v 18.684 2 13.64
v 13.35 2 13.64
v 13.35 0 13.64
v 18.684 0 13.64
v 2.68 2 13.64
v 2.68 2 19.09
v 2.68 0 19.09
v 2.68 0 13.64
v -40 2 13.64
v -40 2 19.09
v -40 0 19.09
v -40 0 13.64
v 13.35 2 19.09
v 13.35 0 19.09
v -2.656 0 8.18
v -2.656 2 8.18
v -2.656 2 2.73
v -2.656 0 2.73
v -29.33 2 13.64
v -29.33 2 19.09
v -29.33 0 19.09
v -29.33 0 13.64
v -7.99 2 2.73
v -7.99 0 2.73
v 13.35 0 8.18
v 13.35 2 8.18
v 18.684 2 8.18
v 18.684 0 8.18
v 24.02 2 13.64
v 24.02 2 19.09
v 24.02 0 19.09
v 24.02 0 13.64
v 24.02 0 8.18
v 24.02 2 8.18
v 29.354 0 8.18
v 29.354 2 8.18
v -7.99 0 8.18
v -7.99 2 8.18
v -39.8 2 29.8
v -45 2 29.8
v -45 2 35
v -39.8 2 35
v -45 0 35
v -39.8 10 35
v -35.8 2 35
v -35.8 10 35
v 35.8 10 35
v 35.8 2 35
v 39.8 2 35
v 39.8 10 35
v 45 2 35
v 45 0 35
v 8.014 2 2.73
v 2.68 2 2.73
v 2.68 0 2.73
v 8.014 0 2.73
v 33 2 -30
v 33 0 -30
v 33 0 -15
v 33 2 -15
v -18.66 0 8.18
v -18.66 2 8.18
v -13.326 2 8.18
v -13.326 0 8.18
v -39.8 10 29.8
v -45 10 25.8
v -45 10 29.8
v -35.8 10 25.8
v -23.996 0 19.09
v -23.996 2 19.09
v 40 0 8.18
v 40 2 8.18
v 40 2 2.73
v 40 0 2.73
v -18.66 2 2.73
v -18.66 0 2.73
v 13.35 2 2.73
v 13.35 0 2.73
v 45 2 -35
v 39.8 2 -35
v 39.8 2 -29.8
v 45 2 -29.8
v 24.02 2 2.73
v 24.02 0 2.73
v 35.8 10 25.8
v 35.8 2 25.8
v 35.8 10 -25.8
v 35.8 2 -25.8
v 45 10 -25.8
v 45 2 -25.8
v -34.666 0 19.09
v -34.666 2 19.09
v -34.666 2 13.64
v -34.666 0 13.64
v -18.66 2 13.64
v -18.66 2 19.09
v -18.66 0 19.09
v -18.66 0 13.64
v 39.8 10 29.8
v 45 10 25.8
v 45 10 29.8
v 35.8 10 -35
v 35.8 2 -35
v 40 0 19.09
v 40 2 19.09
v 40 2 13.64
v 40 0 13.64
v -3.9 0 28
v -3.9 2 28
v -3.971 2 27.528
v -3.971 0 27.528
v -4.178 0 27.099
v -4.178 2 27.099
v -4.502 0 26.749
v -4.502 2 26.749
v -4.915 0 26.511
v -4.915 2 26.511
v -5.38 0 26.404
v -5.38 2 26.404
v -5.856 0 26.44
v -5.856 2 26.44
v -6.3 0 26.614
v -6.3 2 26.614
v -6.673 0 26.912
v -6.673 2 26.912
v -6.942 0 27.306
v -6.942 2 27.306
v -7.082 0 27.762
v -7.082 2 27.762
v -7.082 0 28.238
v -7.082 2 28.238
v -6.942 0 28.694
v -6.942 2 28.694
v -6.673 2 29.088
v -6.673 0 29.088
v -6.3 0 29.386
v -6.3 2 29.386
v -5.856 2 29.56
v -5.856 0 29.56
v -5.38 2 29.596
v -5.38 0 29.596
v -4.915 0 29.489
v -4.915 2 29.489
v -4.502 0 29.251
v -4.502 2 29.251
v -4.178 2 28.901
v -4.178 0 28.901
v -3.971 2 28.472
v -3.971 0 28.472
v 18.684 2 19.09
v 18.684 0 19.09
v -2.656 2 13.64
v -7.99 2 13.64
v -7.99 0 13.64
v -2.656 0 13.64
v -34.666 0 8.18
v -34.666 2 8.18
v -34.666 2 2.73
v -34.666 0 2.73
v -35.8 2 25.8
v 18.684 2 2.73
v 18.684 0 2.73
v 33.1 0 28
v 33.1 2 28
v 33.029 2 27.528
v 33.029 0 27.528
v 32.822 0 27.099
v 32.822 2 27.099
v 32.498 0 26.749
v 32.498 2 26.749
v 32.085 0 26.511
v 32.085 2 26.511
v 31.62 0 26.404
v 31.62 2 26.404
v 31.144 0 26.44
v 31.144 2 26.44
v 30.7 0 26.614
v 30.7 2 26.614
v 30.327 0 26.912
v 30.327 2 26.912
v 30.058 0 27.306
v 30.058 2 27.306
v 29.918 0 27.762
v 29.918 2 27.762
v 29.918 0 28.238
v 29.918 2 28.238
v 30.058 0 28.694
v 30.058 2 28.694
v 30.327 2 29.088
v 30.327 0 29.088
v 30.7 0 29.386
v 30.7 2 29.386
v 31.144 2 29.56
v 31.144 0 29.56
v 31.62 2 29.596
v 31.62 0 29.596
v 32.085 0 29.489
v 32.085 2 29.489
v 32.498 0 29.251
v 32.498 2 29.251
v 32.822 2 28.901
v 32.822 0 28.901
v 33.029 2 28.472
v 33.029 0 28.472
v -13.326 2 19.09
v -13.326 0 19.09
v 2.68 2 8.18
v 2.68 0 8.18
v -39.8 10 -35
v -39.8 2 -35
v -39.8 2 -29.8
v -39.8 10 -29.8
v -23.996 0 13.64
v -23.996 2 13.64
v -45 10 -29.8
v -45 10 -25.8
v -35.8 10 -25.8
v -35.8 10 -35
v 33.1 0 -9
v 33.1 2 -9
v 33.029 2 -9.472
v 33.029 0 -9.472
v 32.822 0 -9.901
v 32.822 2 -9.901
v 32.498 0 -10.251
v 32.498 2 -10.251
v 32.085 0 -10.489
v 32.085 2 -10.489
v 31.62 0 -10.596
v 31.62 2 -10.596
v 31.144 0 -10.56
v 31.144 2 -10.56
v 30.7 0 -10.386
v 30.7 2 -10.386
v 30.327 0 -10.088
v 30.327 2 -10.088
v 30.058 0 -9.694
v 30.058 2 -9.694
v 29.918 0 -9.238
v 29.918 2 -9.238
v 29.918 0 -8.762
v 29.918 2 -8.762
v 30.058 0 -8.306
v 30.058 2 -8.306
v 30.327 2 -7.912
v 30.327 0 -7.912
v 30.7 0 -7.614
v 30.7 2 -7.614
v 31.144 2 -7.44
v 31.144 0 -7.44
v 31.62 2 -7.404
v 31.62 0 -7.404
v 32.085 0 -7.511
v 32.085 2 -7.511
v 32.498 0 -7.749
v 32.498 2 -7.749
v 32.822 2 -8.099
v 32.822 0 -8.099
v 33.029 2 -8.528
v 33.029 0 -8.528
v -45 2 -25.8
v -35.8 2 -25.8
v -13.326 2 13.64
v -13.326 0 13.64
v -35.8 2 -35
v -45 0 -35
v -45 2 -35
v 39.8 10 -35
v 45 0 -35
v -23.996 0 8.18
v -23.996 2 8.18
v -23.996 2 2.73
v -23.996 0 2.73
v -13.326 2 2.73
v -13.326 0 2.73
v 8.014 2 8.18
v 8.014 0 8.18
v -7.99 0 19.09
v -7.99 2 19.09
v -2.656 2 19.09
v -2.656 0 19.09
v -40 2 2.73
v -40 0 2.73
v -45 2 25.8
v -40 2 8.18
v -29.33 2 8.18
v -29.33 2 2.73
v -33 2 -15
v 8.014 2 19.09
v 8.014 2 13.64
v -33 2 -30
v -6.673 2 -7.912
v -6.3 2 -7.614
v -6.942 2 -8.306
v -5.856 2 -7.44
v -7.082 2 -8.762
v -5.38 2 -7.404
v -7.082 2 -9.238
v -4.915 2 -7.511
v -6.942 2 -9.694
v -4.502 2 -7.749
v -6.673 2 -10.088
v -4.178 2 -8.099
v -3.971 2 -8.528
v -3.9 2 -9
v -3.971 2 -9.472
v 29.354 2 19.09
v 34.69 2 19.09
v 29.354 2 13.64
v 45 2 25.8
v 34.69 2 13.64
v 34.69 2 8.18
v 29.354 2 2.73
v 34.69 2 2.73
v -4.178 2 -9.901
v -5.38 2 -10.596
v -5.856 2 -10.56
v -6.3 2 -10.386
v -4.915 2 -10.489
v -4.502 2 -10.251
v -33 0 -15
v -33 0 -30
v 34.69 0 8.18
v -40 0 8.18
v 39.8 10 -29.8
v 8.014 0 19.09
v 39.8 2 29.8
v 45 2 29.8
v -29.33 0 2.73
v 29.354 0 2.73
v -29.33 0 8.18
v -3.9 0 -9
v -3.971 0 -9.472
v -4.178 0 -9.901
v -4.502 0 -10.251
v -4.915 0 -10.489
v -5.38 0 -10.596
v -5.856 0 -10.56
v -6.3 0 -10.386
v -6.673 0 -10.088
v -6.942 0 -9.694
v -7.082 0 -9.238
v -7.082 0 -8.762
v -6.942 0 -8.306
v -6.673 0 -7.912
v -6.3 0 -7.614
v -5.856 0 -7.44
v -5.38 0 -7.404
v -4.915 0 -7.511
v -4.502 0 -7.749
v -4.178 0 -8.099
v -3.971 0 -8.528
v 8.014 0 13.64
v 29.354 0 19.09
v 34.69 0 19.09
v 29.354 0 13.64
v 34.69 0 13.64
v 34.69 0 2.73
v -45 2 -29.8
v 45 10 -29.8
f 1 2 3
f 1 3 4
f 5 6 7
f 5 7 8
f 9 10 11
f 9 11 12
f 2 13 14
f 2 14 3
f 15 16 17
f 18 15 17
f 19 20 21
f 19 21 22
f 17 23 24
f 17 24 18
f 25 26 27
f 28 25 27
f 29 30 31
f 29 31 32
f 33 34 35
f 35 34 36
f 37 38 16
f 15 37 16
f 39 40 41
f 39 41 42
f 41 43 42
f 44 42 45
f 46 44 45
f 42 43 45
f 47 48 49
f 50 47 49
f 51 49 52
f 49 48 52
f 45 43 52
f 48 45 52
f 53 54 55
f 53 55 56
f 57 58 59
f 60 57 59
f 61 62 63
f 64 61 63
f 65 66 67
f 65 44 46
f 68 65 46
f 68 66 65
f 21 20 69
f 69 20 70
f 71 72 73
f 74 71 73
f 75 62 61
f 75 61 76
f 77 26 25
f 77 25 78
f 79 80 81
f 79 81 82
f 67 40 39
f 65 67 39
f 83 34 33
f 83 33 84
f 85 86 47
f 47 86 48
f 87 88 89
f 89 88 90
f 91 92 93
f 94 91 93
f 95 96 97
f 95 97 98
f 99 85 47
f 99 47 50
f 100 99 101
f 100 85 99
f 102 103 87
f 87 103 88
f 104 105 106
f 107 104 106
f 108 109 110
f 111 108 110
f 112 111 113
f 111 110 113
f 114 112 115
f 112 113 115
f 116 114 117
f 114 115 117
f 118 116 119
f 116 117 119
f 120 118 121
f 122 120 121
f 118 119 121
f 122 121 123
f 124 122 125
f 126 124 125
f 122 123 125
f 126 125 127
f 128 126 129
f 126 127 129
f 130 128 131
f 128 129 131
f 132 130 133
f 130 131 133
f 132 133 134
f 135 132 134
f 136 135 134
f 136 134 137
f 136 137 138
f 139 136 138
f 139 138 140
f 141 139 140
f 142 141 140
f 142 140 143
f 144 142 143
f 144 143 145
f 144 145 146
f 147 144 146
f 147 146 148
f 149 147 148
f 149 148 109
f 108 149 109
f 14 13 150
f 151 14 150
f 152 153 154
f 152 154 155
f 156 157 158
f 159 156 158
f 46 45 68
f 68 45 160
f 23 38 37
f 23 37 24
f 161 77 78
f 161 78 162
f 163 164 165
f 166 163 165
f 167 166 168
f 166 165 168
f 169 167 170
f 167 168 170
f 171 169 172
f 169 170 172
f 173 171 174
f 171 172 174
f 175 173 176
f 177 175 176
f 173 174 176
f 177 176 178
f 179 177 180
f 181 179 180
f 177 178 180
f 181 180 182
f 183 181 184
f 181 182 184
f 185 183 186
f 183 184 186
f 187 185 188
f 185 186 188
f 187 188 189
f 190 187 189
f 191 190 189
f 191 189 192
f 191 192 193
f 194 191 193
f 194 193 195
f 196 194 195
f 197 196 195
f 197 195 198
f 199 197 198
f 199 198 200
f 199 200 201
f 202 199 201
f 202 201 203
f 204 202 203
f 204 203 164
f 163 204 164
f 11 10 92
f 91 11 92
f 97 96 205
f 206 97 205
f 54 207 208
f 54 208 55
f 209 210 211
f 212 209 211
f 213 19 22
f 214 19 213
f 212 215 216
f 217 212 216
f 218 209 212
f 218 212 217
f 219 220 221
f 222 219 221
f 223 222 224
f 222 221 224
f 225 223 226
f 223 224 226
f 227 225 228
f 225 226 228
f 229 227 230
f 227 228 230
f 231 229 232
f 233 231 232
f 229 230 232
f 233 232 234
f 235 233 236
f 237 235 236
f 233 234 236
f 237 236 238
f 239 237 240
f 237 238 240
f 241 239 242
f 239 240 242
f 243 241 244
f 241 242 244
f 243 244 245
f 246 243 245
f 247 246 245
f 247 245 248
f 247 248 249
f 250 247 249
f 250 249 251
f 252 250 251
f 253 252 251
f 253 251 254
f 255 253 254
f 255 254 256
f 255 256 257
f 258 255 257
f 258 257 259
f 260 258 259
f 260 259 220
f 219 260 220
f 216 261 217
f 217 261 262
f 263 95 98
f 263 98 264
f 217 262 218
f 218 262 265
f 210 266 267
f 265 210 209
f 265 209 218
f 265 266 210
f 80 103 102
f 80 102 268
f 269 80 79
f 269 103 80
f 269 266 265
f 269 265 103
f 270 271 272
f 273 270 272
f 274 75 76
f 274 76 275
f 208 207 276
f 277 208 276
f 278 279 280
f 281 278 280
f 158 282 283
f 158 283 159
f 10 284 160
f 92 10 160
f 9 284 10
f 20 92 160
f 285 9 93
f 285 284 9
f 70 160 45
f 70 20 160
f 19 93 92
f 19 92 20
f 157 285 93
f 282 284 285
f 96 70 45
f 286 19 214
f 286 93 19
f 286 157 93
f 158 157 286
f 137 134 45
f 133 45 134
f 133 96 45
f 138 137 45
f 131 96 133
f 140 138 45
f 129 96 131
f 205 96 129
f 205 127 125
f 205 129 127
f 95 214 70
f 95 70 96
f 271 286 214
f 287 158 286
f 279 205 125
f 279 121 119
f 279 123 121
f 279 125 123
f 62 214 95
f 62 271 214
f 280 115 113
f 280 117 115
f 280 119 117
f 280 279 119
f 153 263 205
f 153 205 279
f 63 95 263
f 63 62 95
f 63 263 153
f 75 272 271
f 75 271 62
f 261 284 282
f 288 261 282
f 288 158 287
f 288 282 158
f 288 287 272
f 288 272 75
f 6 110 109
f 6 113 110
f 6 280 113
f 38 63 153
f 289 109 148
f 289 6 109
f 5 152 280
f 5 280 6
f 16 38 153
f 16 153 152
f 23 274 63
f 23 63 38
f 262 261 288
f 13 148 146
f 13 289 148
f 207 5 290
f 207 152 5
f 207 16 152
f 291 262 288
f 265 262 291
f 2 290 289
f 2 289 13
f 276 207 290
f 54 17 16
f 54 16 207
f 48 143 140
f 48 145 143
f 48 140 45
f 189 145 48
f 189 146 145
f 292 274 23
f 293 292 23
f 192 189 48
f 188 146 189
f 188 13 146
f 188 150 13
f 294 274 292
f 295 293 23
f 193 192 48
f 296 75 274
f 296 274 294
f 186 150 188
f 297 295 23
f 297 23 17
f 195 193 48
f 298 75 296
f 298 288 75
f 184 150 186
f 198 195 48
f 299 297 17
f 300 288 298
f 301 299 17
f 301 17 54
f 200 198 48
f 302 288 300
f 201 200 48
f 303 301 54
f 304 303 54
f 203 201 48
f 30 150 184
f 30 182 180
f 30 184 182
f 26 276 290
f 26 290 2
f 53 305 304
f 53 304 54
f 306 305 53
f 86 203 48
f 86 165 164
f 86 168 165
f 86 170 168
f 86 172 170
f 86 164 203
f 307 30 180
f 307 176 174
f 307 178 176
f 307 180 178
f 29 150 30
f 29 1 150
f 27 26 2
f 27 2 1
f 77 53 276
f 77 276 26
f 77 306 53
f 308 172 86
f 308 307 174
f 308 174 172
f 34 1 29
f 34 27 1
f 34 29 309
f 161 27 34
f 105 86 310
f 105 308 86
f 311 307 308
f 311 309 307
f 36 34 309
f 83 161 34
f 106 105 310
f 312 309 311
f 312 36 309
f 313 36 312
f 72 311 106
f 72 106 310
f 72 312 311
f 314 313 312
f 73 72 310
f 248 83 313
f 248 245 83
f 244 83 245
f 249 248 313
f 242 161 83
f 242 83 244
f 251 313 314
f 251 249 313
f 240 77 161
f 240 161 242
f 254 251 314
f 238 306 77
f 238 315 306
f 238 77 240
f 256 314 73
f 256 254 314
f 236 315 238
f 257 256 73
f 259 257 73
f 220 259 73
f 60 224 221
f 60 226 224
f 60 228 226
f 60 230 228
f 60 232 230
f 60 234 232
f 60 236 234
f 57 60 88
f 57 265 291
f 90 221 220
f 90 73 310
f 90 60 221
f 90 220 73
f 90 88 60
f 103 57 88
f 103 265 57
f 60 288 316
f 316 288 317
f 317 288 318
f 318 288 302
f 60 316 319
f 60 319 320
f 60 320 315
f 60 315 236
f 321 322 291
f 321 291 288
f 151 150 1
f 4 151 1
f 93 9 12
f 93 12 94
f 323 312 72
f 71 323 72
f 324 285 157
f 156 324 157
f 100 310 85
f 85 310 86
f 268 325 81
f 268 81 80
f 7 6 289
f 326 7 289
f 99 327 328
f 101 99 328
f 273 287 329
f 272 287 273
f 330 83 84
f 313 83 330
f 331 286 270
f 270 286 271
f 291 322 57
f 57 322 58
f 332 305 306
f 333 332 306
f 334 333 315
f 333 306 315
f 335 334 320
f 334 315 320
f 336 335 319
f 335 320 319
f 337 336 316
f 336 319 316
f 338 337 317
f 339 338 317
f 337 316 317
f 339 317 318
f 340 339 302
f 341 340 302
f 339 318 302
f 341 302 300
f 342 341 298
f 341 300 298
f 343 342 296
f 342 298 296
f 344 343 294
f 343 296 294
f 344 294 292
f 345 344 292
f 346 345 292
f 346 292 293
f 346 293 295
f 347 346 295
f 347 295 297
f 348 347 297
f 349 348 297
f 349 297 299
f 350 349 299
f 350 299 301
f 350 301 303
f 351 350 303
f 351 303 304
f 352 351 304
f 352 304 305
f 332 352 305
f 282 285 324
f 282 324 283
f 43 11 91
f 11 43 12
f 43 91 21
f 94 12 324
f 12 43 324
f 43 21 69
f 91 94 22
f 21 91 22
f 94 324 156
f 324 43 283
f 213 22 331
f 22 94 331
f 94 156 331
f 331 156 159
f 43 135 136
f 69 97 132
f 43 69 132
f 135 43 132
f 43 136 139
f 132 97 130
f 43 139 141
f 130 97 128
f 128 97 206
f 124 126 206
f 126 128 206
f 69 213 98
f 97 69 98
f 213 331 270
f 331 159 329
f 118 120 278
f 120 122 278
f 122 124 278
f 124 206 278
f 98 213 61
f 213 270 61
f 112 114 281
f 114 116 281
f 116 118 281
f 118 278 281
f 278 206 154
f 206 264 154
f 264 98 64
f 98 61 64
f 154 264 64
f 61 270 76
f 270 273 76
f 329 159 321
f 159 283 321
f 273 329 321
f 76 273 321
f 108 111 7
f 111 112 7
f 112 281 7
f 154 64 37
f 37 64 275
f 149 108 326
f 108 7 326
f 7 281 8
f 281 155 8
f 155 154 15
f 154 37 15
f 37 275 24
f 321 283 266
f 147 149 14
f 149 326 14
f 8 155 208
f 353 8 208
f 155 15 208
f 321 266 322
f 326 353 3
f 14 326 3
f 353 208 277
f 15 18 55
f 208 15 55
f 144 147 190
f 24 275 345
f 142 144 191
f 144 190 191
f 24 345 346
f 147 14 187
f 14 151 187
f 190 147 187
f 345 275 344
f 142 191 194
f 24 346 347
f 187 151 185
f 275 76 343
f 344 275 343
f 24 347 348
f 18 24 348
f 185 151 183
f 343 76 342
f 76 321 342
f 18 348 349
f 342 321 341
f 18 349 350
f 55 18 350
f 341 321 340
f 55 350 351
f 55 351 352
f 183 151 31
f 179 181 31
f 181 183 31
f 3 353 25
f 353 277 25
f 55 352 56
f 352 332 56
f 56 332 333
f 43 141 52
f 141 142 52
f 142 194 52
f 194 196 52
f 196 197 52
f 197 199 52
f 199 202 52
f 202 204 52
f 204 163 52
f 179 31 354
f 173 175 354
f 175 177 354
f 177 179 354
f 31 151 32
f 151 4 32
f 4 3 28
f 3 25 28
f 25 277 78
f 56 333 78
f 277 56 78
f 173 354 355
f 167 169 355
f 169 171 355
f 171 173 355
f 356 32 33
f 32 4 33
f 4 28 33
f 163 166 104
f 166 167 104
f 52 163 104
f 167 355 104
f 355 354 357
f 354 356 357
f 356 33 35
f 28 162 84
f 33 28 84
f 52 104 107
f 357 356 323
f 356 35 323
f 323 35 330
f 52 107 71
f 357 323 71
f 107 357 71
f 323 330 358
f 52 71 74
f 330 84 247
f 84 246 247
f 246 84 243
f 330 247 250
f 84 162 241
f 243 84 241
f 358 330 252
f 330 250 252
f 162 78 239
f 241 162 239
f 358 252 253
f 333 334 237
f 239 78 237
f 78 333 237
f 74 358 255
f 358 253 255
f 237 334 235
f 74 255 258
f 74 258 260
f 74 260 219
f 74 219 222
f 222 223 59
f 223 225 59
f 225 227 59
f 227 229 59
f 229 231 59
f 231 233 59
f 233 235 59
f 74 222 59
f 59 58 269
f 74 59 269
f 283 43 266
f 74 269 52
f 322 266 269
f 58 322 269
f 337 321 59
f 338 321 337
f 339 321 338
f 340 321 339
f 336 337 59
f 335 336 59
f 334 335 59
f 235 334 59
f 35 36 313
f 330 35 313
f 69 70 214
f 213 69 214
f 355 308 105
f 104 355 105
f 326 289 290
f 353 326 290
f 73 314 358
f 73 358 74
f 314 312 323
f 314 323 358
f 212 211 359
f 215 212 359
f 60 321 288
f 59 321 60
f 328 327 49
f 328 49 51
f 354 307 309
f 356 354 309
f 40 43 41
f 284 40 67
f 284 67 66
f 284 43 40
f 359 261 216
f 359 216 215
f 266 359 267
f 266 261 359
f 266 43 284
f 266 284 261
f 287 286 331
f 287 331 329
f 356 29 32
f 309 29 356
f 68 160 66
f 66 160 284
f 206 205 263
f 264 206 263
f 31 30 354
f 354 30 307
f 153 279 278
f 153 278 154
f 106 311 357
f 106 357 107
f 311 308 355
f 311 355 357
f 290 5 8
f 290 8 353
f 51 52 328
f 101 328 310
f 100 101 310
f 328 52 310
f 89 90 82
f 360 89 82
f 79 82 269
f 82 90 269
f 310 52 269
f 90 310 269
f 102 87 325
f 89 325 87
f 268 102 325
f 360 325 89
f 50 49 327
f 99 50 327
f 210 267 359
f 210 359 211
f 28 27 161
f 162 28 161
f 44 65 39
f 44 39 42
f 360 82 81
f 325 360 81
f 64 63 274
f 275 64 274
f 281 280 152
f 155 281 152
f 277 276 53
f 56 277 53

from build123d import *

# Parameters (mm, degrees)
ESBO_O1_W                = 90
ESBO_O1_H                = 70
RESSALTO_EXTRUS_O1_DEPTH = 2
RESSALTO_EXTRUS_O4_DEPTH = 8
ESBO_O6_W                = 66
ESBO_O6_H                = 15
CORTE_EXTRUS_O4_DEPTH    = 3
ESBO_O2_W                = 5.334
ESBO_O2_H                = 5.45
ESBO_O2_W_2              = 5.31
CORTE_EXTRUS_O6_DEPTH    = 5
ESBO_O7_R                = 1.6
CORTE_EXTRUS_O7_DEPTH    = 3


with BuildPart() as part:
    # Esboço1 → Ressalto-extrusão1 (new body)
    with BuildSketch(Plane(origin=(0, 0, 0), x_dir=(1, 0, 0), z_dir=(0, 1, 0))):
        Rectangle(ESBO_O1_W, ESBO_O1_H)
    extrude(amount=RESSALTO_EXTRUS_O1_DEPTH)

    # Esboço3 → Ressalto-extrusão4 (add)
    with BuildSketch(Plane(origin=(0, 2, 0), x_dir=(1, 0, 0), z_dir=(0, 1, 0))):
        Polygon((-35.8, -25.8), (-45, -25.8), (-45, -29.8), (-39.8, -29.8), (-39.8, -35), (-35.8, -35), align=None)
        Polygon((45, -29.8), (45, -25.8), (35.8, -25.8), (35.8, -35), (39.8, -35), (39.8, -29.8), align=None)
        Polygon((39.8, 35), (35.8, 35), (35.8, 25.8), (45, 25.8), (45, 29.8), (39.8, 29.8), align=None)
        Polygon((-35.8, 35), (-39.8, 35), (-39.8, 29.8), (-45, 29.8), (-45, 25.8), (-35.8, 25.8), align=None)
    extrude(amount=RESSALTO_EXTRUS_O4_DEPTH)

    # Esboço6 → Corte-extrusão4 (cut)
    with BuildSketch(Plane.XZ):
        with Locations((0, -22.5)):
            Rectangle(ESBO_O6_W, ESBO_O6_H)
    extrude(amount=-CORTE_EXTRUS_O4_DEPTH, mode=Mode.SUBTRACT)

    # Esboço2 → Corte-extrusão6 (cut)
    with BuildSketch(Plane(origin=(0, 2, 0), x_dir=(1, 0, 0), z_dir=(0, 1, 0))):
        with Locations((-37.333, -16.365)):
            Rectangle(ESBO_O2_W, ESBO_O2_H)
        with Locations((-37.333, -5.455)):
            Rectangle(ESBO_O2_W, ESBO_O2_H)
        with Locations((-26.663, -16.365)):
            Rectangle(ESBO_O2_W, ESBO_O2_H)
        with Locations((-26.663, -5.455)):
            Rectangle(ESBO_O2_W, ESBO_O2_H)
        with Locations((-15.993, -16.365)):
            Rectangle(ESBO_O2_W, ESBO_O2_H)
        with Locations((-15.993, -5.455)):
            Rectangle(ESBO_O2_W, ESBO_O2_H)
        with Locations((-5.323, -16.365)):
            Rectangle(ESBO_O2_W, ESBO_O2_H)
        with Locations((-5.323, -5.455)):
            Rectangle(ESBO_O2_W, ESBO_O2_H)
        with Locations((5.347, -16.365)):
            Rectangle(ESBO_O2_W, ESBO_O2_H)
        with Locations((5.347, -5.455)):
            Rectangle(ESBO_O2_W, ESBO_O2_H)
        with Locations((16.017, -16.365)):
            Rectangle(ESBO_O2_W, ESBO_O2_H)
        with Locations((16.017, -5.455)):
            Rectangle(ESBO_O2_W, ESBO_O2_H)
        with Locations((26.687, -16.365)):
            Rectangle(ESBO_O2_W, ESBO_O2_H)
        with Locations((26.687, -5.455)):
            Rectangle(ESBO_O2_W, ESBO_O2_H)
        with Locations((37.345, -16.365)):
            Rectangle(ESBO_O2_W_2, ESBO_O2_H)
        with Locations((37.345, -5.455)):
            Rectangle(ESBO_O2_W_2, ESBO_O2_H)
    extrude(amount=-CORTE_EXTRUS_O6_DEPTH, mode=Mode.SUBTRACT)

    # Esboço7 → Corte-extrusão7 (cut)
    with BuildSketch(Plane(origin=(0, 2, 0), x_dir=(1, 0, 0), z_dir=(0, 1, 0))):
        with Locations((31.5, 9)):
            Circle(ESBO_O7_R)
        with Locations((-5.5, 9)):
            Circle(ESBO_O7_R)
        with Locations((-5.5, -28)):
            Circle(ESBO_O7_R)
        with Locations((31.5, -28)):
            Circle(ESBO_O7_R)
    extrude(amount=-CORTE_EXTRUS_O7_DEPTH, mode=Mode.SUBTRACT)


solid = part.part
